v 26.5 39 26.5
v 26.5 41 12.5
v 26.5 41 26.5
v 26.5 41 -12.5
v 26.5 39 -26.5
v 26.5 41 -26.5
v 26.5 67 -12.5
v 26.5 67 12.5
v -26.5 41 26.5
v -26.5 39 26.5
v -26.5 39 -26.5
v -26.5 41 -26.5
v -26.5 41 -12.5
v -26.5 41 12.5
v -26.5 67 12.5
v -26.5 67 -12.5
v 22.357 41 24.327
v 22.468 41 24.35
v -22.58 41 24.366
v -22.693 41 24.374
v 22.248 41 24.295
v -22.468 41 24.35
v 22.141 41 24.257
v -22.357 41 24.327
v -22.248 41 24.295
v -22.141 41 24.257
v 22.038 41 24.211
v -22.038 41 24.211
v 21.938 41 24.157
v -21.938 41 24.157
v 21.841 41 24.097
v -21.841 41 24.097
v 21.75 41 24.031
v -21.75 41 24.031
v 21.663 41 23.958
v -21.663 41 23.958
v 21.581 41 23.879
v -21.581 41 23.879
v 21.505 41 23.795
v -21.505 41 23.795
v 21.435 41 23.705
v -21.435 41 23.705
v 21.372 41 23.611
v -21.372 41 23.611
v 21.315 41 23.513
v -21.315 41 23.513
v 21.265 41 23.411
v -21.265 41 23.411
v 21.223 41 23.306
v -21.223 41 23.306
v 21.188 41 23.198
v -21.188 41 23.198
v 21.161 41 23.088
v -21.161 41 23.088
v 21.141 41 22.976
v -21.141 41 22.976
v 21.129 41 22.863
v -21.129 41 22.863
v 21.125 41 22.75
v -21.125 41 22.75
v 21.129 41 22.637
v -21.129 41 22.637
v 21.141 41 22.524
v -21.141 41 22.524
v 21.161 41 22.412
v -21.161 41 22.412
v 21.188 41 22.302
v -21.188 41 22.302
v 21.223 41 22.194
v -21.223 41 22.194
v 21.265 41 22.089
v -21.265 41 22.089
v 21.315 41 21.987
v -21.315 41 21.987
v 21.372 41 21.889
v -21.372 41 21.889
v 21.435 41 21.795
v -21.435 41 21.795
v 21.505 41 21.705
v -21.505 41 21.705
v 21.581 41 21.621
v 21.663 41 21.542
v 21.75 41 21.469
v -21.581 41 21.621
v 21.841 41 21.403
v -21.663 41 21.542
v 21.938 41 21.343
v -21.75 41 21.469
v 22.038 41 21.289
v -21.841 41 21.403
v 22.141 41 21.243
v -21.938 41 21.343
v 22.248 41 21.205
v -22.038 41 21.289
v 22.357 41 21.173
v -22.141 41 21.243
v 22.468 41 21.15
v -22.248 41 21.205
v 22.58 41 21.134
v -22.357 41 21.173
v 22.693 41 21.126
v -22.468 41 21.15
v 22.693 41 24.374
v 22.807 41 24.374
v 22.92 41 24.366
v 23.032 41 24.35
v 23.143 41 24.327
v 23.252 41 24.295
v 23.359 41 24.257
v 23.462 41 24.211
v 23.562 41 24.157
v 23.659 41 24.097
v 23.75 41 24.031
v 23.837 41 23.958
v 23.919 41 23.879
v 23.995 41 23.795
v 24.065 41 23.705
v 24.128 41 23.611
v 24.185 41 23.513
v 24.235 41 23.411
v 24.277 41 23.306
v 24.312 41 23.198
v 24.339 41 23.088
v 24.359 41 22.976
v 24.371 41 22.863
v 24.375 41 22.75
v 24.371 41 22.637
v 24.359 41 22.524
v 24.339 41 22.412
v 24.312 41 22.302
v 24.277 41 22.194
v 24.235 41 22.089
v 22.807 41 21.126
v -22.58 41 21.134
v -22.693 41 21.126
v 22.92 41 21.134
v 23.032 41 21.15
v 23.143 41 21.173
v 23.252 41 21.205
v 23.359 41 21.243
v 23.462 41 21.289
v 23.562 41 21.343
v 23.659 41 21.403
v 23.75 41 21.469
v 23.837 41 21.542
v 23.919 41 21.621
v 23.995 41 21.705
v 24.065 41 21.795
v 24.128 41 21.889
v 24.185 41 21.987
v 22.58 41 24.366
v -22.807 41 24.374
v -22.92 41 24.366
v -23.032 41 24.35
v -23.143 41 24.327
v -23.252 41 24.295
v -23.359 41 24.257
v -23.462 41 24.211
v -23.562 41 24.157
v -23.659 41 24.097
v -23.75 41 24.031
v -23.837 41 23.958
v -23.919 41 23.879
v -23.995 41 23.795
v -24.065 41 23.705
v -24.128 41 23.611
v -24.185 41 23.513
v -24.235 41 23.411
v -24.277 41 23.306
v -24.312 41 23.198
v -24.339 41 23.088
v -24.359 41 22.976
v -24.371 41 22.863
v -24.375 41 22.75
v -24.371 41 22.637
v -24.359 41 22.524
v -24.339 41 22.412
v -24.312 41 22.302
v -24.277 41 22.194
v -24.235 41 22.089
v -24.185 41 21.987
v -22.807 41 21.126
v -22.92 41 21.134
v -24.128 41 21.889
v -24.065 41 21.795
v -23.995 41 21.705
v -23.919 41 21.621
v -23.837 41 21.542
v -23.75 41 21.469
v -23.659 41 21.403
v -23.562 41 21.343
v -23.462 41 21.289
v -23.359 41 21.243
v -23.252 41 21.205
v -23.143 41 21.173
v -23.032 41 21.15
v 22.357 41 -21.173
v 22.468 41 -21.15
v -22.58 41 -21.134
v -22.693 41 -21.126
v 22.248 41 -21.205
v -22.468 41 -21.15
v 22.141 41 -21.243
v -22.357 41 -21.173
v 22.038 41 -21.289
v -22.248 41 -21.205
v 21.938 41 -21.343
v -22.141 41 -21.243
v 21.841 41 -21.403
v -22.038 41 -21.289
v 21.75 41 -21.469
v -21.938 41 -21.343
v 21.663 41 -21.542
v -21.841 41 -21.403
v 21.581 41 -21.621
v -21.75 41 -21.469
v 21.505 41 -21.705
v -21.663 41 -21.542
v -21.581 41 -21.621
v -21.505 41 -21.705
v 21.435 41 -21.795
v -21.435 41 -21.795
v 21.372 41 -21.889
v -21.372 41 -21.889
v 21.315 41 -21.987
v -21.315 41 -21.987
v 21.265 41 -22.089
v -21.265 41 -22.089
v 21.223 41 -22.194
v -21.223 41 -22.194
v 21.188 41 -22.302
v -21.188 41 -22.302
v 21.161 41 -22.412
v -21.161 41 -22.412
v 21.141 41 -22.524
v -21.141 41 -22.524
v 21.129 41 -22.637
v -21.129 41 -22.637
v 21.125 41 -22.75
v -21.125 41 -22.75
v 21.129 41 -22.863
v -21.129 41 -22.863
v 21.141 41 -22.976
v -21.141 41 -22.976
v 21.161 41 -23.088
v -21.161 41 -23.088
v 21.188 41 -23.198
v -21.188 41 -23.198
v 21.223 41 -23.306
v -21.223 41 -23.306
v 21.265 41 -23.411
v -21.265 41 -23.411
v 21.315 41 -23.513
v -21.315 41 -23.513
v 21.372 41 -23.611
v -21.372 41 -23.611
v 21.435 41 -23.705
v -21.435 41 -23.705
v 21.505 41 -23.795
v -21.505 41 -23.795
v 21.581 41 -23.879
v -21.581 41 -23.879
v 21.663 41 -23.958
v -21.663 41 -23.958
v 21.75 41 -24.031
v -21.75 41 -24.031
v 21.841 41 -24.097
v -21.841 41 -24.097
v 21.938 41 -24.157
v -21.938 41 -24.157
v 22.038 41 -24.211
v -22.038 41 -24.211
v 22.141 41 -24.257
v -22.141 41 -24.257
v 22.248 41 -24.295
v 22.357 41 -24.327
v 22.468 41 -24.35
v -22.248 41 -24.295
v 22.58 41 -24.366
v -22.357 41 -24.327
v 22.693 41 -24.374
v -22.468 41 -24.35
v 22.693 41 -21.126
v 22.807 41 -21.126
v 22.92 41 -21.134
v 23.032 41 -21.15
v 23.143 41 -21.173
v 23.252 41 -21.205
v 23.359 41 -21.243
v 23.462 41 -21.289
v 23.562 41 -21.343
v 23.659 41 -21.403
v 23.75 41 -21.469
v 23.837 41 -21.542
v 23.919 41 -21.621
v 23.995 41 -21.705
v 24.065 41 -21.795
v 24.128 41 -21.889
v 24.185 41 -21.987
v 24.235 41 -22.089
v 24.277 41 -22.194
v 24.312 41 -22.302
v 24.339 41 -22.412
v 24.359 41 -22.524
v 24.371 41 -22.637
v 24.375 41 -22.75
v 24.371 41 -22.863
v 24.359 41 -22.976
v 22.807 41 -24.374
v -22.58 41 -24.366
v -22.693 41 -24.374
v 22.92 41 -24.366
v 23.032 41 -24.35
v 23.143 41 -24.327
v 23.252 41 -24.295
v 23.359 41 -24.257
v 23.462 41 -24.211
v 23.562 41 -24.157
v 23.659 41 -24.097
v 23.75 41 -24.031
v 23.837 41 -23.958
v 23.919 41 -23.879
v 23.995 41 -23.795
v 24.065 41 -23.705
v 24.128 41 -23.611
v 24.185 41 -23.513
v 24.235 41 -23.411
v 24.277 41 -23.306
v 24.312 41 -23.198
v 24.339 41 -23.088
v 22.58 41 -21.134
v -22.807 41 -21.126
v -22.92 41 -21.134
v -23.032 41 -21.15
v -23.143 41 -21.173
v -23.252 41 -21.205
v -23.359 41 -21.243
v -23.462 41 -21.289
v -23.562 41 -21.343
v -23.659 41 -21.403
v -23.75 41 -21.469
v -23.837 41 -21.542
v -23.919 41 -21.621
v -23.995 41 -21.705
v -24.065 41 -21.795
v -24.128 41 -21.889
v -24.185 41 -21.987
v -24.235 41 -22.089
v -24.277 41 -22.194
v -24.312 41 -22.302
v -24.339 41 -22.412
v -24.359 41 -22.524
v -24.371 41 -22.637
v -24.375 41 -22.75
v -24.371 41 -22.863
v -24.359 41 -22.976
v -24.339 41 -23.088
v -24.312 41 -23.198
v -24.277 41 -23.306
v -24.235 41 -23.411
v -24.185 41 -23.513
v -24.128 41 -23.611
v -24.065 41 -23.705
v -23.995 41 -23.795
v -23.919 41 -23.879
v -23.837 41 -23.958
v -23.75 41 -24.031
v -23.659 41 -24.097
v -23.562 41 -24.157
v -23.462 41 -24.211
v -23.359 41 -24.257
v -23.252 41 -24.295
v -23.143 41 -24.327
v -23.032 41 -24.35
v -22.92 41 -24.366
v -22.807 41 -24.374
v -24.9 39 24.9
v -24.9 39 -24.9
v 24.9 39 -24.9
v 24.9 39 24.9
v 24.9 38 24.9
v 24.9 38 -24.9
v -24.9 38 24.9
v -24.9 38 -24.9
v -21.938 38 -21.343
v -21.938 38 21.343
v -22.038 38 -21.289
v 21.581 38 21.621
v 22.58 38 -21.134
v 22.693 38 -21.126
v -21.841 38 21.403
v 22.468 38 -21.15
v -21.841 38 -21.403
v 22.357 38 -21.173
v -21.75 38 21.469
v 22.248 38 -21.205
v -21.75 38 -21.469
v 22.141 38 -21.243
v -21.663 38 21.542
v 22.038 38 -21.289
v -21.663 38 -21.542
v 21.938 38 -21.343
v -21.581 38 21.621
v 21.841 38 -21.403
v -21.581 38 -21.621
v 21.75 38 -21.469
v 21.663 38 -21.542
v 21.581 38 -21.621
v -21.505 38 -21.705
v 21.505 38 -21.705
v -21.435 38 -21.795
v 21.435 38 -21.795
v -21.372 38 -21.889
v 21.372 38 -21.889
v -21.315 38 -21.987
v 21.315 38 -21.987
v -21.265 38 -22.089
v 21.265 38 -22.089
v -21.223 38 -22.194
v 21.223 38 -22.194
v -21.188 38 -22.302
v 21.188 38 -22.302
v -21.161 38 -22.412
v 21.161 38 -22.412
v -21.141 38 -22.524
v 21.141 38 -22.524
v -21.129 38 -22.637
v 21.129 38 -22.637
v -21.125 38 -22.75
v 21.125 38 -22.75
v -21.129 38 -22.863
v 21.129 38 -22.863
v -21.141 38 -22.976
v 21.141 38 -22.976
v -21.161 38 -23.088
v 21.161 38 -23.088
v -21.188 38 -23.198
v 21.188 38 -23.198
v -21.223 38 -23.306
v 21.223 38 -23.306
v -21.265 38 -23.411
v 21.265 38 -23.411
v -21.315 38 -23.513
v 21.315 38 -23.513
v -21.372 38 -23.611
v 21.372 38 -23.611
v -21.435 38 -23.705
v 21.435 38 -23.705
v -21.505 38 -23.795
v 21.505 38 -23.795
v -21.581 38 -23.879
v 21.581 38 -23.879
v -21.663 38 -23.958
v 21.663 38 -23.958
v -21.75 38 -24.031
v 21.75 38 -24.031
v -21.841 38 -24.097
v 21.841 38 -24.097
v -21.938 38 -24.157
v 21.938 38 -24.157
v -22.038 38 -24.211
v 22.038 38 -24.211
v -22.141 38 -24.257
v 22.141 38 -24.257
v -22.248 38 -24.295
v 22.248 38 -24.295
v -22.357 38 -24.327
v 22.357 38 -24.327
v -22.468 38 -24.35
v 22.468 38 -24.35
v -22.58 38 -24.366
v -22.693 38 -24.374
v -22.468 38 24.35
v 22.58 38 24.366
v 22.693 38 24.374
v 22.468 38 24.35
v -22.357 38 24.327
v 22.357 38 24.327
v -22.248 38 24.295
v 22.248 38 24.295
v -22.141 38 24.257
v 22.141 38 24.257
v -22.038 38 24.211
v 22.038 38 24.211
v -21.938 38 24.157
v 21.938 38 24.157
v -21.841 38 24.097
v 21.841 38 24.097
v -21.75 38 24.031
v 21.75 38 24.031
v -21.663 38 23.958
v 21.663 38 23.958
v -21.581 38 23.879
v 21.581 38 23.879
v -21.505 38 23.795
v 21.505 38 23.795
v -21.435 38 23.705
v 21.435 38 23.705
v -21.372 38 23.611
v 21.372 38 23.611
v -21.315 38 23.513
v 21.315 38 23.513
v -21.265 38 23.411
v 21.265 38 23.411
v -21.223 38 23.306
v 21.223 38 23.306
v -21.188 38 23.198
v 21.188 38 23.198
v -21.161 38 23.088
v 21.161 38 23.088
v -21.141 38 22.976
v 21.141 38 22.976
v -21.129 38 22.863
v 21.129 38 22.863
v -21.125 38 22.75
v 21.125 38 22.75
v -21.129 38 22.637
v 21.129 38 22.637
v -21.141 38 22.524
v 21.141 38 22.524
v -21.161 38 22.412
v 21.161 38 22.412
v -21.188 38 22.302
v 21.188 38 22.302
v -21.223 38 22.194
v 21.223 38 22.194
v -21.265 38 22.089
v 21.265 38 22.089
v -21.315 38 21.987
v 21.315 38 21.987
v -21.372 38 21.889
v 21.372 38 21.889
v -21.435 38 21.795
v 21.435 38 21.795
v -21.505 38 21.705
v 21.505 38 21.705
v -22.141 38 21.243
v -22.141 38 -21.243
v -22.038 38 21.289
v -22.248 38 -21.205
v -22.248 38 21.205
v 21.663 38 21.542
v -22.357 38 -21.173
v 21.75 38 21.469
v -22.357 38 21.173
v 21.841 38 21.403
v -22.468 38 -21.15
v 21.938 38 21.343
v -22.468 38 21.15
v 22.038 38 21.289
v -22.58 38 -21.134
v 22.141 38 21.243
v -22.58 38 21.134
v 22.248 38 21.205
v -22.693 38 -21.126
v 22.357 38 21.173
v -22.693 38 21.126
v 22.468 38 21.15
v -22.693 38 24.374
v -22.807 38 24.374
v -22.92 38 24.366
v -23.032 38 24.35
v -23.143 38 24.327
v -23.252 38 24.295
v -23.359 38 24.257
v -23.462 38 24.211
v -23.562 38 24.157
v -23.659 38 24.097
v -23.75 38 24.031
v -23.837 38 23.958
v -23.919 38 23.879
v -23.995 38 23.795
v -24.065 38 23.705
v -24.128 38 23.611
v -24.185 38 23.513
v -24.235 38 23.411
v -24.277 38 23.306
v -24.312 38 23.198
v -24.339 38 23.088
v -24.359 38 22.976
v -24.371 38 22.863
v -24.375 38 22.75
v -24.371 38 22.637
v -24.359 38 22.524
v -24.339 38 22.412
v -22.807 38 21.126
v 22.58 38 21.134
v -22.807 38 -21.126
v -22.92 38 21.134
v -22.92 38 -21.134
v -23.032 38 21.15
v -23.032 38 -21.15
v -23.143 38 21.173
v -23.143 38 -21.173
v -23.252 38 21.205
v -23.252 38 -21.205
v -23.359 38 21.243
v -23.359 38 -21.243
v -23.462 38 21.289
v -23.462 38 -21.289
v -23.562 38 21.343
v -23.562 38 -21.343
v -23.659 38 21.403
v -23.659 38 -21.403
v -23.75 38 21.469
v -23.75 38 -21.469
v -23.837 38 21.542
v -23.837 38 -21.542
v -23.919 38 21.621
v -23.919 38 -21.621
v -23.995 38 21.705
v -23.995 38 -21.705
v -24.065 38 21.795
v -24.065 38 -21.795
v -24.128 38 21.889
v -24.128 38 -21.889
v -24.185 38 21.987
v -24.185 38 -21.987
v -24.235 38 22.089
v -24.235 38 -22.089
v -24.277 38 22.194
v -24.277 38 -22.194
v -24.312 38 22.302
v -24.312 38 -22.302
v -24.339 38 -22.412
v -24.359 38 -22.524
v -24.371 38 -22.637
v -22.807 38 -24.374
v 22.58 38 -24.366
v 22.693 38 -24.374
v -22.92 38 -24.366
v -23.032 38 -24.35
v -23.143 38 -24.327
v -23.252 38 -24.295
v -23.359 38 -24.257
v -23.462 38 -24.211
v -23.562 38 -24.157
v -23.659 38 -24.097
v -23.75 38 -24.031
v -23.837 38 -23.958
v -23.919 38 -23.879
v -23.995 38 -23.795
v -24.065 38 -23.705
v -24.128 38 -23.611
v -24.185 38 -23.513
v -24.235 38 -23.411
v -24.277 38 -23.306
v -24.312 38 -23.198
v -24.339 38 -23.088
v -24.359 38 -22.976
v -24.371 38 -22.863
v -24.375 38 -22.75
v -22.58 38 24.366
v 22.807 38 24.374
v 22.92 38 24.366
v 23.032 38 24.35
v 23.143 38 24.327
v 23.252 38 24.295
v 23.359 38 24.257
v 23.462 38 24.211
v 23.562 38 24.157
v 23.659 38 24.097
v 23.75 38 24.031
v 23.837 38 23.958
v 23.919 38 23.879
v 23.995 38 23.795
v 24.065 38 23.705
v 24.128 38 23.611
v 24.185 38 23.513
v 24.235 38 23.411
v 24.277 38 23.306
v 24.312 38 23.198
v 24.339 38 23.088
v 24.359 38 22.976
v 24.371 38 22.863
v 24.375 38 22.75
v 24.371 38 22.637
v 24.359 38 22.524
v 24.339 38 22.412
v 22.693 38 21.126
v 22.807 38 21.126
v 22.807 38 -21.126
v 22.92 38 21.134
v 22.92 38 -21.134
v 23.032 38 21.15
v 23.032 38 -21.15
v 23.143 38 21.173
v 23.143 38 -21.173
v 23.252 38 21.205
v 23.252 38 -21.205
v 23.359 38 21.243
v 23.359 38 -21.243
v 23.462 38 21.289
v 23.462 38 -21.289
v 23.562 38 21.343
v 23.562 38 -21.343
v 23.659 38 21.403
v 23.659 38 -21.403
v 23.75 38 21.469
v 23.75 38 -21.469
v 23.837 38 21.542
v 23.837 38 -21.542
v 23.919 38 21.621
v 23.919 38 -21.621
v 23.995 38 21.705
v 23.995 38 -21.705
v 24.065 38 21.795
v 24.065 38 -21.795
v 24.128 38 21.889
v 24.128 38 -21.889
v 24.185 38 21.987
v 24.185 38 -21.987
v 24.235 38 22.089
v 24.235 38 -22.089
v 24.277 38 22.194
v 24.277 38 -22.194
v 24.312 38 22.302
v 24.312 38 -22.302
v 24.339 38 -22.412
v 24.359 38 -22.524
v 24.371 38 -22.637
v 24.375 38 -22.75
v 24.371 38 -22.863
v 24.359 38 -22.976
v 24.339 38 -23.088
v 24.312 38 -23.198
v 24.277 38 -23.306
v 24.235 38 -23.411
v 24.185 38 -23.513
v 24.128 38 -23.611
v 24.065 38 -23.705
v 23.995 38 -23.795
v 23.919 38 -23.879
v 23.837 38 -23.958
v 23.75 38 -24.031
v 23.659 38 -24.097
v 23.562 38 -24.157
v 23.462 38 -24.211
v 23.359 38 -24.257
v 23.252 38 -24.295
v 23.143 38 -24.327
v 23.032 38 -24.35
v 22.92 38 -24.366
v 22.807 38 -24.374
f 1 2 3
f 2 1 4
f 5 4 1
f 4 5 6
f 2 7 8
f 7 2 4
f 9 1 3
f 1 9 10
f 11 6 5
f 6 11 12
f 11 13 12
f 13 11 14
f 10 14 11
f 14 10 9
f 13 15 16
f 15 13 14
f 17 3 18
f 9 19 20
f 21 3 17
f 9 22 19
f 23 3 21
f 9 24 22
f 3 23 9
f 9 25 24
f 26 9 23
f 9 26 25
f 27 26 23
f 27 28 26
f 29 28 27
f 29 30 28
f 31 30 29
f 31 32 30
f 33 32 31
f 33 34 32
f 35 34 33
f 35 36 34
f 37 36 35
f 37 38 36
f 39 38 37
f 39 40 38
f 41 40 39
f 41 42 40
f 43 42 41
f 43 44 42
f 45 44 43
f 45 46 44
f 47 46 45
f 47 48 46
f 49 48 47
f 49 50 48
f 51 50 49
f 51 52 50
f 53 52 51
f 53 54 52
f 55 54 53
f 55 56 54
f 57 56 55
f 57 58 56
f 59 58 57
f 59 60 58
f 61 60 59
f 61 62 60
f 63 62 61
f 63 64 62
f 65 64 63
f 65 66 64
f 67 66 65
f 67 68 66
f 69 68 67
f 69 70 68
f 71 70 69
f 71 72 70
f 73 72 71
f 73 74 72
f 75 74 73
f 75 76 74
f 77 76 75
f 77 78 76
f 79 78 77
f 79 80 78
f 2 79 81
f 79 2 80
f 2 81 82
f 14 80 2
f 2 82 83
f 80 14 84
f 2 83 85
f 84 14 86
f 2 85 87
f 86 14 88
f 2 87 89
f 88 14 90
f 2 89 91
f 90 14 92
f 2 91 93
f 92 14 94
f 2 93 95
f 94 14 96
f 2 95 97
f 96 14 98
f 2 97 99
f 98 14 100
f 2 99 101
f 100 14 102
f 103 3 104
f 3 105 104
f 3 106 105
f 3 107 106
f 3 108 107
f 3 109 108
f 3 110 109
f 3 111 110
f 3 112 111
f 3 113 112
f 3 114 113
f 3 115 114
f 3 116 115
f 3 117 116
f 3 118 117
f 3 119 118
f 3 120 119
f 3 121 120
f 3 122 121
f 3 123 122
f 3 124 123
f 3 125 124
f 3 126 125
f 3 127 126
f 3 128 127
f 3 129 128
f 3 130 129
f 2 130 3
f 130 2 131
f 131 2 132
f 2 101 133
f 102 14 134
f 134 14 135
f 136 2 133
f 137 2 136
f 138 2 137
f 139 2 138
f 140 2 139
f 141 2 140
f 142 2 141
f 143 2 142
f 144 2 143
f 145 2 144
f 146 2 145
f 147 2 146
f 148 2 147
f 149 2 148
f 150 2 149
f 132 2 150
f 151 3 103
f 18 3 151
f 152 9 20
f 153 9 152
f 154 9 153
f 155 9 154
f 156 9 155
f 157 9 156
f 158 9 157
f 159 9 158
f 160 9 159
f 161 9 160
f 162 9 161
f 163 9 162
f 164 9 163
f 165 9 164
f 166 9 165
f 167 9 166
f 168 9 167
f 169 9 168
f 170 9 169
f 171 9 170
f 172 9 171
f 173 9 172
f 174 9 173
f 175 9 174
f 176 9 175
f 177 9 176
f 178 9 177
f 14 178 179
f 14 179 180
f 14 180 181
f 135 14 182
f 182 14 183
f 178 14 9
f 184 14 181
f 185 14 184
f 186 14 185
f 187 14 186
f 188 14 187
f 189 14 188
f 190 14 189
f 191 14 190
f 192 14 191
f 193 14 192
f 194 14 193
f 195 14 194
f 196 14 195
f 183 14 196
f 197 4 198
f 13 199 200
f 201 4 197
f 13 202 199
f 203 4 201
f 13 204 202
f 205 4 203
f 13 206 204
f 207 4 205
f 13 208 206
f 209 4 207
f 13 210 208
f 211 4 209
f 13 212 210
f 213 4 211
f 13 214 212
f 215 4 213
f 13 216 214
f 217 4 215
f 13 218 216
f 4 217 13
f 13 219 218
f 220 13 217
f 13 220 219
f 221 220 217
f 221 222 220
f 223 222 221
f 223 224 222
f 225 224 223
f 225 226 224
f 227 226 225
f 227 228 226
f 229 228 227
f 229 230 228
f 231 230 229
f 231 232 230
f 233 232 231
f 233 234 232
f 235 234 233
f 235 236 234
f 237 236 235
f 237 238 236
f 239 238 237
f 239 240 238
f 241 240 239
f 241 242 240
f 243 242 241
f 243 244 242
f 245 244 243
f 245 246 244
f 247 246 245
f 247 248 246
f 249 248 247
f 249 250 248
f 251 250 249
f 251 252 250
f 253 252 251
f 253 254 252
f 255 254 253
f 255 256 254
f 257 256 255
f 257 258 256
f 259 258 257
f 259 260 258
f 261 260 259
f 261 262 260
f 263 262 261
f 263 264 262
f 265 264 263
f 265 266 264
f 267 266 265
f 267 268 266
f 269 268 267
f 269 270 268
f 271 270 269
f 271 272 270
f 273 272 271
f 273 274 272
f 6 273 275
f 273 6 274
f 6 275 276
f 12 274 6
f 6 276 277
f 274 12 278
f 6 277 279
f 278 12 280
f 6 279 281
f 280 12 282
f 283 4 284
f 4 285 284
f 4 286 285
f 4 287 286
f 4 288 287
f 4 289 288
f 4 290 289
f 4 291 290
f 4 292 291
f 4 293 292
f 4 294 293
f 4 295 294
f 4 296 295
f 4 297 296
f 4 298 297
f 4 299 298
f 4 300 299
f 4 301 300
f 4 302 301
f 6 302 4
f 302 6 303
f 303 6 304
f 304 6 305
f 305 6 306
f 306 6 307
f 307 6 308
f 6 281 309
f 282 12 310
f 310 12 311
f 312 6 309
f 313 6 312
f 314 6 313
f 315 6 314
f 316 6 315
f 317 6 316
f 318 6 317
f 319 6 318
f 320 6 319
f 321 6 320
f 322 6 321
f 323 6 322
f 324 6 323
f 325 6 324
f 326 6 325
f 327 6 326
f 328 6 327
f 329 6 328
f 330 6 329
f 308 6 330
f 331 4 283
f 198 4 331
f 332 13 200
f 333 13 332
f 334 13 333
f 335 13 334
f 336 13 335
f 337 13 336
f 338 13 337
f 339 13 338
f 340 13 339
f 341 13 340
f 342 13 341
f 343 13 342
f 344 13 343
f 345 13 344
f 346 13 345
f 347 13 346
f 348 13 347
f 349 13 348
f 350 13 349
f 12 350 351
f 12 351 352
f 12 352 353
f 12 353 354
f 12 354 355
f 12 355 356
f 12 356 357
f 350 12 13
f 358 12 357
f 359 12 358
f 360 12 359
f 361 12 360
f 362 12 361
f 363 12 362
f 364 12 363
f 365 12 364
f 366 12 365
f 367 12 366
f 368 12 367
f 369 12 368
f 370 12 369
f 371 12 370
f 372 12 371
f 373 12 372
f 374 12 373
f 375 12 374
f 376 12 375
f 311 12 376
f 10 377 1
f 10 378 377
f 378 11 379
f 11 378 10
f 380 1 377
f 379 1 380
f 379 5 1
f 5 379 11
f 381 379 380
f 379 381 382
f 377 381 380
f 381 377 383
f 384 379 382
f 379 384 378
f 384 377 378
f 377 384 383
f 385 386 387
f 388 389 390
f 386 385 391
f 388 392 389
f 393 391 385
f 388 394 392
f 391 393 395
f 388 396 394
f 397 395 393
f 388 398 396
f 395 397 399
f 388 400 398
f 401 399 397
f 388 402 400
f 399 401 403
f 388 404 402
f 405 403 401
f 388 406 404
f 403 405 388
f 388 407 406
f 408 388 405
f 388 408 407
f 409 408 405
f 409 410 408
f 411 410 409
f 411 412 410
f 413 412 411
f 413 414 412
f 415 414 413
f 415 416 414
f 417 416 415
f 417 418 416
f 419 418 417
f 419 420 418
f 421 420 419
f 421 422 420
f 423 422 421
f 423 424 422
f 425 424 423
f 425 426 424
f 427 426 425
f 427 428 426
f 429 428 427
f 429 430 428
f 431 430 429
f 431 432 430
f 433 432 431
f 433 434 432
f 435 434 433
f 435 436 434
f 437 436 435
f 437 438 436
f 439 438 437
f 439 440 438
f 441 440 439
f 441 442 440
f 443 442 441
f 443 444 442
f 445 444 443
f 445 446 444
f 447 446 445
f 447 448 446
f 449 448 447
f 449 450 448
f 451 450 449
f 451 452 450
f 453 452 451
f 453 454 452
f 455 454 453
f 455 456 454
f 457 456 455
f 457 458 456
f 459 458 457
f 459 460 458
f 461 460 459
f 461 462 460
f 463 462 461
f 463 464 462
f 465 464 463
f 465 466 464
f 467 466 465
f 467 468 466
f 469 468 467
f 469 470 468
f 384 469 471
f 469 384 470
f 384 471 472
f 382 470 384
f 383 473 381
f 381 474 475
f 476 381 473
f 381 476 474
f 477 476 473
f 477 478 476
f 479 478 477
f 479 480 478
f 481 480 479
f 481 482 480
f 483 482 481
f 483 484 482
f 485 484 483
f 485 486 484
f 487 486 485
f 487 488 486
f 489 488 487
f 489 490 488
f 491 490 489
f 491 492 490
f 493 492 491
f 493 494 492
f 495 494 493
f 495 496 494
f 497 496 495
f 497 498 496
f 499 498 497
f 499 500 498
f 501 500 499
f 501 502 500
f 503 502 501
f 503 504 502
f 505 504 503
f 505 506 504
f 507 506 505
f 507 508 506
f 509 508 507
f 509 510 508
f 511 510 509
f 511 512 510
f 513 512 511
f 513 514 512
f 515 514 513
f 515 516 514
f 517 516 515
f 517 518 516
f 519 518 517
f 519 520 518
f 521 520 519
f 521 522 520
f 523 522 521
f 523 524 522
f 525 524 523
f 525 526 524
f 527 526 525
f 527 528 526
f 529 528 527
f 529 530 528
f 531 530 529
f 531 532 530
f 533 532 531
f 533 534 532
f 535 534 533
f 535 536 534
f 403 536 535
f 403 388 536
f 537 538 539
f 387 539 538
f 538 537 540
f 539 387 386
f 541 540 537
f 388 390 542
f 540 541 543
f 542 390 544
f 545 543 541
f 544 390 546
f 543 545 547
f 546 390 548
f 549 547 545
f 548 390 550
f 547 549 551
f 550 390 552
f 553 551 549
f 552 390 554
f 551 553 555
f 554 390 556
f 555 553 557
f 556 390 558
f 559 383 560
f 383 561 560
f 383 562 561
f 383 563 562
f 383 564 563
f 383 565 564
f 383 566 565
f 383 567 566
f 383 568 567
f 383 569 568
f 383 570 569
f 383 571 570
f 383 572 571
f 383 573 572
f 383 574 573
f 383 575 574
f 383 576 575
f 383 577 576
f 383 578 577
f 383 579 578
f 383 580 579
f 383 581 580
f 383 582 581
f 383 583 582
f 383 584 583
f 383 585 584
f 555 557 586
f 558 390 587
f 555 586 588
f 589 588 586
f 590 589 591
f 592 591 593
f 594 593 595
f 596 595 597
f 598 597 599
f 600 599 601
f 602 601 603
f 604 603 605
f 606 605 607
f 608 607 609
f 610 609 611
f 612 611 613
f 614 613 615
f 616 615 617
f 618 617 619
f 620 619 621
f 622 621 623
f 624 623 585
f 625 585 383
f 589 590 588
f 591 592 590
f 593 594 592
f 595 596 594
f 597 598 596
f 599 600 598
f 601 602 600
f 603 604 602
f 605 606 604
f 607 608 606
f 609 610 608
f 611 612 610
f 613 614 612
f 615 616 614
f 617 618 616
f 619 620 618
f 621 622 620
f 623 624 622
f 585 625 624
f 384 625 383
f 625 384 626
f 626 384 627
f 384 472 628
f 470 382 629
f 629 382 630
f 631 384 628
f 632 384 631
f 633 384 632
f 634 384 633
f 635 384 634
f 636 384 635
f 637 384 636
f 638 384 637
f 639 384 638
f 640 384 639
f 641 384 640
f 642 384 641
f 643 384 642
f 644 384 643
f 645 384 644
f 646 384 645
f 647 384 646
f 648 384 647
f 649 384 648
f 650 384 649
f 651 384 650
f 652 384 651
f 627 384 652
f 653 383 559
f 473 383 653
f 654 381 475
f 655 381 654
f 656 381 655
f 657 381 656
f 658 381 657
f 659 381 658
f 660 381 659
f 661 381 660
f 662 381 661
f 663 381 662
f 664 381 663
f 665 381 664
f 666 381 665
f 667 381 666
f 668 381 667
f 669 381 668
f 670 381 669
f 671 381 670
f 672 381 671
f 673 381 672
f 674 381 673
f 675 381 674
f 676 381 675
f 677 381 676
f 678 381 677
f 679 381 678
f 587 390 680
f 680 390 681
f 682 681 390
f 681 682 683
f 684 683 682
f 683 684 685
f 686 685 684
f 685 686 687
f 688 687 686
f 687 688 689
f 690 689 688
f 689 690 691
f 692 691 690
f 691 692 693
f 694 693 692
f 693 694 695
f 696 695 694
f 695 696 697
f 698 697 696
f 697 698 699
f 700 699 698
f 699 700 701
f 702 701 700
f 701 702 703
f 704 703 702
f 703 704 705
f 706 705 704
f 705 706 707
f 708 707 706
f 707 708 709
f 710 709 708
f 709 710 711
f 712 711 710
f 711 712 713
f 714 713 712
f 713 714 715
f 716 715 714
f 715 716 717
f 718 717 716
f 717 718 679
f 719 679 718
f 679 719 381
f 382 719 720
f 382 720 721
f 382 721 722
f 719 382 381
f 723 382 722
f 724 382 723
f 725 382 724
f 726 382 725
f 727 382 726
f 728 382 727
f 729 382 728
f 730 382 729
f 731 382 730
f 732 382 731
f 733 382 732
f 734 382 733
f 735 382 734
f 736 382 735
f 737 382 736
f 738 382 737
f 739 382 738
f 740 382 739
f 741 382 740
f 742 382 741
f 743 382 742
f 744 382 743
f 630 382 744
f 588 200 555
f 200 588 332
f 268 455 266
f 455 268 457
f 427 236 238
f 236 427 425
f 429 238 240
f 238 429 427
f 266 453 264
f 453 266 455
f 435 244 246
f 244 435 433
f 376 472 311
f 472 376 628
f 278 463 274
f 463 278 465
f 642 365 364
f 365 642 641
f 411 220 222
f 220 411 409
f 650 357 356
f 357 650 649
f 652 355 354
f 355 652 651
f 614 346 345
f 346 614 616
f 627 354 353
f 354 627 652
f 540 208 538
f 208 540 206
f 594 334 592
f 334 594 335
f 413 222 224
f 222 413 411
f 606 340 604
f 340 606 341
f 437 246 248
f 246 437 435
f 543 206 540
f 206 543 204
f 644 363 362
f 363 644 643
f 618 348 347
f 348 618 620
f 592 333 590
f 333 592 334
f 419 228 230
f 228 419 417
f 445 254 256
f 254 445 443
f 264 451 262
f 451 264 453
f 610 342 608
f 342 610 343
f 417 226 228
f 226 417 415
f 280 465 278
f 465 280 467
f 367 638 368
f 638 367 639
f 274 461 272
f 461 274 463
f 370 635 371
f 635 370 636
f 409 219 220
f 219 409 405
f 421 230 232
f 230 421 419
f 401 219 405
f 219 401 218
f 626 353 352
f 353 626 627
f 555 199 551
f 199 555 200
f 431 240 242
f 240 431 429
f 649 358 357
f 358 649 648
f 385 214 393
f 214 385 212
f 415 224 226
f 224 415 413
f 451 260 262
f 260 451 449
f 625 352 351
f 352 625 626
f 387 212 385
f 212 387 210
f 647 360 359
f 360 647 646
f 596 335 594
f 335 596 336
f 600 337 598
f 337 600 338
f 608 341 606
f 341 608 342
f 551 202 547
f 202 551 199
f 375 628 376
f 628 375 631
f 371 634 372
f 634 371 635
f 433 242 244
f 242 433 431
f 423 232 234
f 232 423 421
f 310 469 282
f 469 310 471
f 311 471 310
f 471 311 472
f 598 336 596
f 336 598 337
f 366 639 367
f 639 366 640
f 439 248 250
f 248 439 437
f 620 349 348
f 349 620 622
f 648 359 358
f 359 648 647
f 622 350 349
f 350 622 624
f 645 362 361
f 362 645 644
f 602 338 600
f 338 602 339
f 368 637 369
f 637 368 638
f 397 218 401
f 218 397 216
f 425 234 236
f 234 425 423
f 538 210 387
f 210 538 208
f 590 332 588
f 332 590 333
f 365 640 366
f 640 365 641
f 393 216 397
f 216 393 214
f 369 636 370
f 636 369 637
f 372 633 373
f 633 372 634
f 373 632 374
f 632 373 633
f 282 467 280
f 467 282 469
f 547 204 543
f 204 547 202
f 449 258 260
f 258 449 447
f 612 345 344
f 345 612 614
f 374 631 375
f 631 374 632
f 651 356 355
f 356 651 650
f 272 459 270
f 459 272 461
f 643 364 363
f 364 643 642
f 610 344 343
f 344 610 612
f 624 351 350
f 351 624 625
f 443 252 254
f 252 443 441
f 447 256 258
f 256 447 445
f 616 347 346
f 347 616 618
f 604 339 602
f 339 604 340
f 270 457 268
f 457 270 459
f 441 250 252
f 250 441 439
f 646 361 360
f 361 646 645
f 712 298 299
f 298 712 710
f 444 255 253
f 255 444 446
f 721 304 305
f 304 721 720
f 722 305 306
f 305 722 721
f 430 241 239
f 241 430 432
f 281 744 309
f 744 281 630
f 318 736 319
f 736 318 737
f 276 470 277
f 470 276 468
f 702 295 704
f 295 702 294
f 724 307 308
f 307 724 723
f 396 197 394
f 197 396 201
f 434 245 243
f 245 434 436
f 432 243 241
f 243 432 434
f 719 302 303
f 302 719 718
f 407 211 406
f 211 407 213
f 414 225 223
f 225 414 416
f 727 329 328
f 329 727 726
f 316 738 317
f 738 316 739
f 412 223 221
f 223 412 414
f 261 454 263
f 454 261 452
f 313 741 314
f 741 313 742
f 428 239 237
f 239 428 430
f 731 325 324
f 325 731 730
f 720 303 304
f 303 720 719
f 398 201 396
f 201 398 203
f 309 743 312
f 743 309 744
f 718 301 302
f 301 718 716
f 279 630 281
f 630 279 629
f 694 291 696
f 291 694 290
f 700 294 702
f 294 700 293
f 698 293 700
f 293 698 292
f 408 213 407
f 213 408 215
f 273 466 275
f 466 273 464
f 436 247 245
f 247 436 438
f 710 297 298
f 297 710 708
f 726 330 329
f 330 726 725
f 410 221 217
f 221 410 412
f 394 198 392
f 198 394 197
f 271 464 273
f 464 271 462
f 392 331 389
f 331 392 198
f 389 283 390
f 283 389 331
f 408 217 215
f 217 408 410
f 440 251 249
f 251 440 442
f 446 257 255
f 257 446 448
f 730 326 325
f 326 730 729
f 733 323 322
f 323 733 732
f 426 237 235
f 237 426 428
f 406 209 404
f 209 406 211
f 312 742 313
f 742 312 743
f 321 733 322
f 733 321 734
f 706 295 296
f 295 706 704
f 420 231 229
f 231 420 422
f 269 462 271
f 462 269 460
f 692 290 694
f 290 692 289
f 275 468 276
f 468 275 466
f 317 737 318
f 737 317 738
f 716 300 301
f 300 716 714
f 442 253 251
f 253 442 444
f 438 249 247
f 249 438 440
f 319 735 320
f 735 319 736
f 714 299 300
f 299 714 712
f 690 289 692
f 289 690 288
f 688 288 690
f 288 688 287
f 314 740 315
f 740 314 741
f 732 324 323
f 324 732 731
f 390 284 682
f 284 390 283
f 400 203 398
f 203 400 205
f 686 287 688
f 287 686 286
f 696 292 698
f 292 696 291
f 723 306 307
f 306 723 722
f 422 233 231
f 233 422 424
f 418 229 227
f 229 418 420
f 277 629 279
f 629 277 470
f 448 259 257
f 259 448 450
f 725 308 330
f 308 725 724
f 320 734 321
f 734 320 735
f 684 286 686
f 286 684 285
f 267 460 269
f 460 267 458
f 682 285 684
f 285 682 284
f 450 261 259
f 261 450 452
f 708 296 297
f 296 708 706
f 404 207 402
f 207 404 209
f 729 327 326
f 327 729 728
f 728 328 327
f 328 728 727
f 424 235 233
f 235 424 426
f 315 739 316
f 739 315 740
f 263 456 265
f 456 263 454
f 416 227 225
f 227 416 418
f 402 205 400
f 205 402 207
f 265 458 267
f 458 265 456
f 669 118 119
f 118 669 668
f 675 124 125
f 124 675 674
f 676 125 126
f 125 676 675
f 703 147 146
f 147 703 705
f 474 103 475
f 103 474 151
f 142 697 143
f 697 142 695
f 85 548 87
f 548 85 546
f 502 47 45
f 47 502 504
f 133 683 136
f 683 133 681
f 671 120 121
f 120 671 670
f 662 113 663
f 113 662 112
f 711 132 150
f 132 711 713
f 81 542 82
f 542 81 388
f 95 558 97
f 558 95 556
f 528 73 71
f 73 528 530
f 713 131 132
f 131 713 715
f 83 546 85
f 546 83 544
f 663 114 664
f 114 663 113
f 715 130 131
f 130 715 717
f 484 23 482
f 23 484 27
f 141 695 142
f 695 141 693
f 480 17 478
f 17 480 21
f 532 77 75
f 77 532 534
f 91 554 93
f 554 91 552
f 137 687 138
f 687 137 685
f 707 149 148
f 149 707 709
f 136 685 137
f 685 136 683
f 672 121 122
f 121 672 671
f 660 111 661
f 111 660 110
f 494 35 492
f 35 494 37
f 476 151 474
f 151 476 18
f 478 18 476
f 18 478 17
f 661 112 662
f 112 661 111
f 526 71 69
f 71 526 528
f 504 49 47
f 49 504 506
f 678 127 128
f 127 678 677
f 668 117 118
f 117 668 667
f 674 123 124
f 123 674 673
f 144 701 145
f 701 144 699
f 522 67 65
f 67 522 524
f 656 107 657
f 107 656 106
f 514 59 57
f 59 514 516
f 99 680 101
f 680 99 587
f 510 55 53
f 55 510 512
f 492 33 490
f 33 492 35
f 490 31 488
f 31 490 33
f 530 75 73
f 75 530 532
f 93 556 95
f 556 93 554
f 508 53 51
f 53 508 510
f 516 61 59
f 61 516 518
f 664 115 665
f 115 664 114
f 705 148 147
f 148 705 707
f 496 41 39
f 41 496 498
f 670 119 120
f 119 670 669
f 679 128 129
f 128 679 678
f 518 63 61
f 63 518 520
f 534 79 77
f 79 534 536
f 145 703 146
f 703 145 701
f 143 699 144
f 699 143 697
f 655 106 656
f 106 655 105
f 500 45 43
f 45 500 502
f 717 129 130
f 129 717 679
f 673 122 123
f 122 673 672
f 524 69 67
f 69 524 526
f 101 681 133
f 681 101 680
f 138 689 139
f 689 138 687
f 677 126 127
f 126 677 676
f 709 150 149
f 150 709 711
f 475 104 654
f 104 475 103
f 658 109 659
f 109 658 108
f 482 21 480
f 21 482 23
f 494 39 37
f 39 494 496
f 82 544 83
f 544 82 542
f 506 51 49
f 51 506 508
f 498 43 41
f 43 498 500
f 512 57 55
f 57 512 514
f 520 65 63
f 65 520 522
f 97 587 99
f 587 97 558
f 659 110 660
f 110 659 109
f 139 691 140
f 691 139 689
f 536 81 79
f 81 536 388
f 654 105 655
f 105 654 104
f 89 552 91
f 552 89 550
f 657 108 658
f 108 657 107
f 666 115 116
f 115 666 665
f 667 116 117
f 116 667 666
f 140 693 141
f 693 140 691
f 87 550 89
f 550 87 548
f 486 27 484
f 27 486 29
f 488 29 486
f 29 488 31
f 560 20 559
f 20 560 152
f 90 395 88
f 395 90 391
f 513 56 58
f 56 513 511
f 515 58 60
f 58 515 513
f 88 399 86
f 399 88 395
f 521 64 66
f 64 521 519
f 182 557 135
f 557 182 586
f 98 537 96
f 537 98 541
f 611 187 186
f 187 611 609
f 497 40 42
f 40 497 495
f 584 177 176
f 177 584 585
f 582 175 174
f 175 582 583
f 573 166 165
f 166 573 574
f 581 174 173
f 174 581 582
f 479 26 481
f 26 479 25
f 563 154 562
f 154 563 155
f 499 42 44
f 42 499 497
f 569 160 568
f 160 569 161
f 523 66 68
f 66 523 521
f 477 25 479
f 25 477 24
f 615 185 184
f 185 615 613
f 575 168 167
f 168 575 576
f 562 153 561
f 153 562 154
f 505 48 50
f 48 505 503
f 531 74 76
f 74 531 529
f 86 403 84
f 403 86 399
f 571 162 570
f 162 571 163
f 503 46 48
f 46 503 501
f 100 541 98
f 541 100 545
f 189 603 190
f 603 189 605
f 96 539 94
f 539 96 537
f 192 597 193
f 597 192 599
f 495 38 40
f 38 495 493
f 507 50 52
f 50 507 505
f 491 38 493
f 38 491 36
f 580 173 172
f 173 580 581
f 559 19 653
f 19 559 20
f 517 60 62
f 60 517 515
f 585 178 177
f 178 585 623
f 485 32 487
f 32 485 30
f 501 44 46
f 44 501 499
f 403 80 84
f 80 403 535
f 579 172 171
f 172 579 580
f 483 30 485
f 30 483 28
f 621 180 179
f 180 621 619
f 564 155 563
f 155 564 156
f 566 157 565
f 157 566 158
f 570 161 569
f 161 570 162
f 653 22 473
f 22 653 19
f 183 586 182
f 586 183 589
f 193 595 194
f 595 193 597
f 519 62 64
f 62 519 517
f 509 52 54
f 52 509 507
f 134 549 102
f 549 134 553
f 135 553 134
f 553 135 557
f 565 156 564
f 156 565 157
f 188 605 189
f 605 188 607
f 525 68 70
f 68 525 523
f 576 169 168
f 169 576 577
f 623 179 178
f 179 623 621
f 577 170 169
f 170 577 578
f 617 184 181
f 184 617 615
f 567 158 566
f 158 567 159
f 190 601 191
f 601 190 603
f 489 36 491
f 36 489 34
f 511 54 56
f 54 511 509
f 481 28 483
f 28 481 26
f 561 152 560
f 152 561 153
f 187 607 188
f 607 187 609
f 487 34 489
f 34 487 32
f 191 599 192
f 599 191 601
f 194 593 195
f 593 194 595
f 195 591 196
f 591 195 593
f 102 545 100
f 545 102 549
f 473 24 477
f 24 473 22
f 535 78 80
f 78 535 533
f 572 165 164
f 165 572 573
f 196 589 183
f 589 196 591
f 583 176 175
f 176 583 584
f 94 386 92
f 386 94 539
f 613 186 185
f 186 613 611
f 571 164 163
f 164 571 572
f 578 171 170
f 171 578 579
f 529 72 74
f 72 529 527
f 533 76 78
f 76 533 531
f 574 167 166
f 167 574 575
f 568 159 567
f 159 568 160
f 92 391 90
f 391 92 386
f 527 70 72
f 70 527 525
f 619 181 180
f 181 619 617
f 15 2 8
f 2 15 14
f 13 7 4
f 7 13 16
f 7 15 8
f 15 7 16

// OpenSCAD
$fn = $preview ? 50 : 90;

!translate([0, 40, 0]) Back();
//PIRScrewMount();

Case();
translate([0, -35 + 2.5, 0]) PIRMount();

module PIRScrewMount() {
  difference() {
        cube([14, 2, 5], true);
        translate([0, 1, 0]) 
            rotate([90, 0, 0]) 
                translate([0, 0, -1]) cylinder(d = 2.5, h = 6);
    }   
}

module Back() {
    difference() {
        translate([0, 0, 0]){
            cube([53, 2, 53], true);
            translate([0, -1, 0]) cube([49.8, 2, 49.8], true);
        }
        translate([0, 10, 0]) ScrewsGuide(true);
    }  
    translate([0, 13.5, 0]) cube([53, 27, 25], true);
}

module Case() {
    tempertureSensorDepth = -30;
    
    translate([0, -20, 0]) difference() {
        cube([53, 28 + 2, 53], true);
        cube([50, 74, 50], true);
        
        //Cut off for cable
        translate([0, 14.1, -26]) cube([5, 2.5, 5], true);
        
        //Cut off for faster printing
        //translate([0, 10, 0]) cube([70, 65, 70], true);
        
    }
    
    // PIR sides fill
    translate([-19, -34, 0]) cube([14, 2, 50], true);
    difference() {
        translate([19, -34, 0]) cube([14, 2, 50], true);
        
        //Cut off for temperature sensor
        translate([0, tempertureSensorDepth, 0]) 
            translate([19, 0, 0]) 
                cube([4.5, 8, 4.5], true);
    }
    
    translate([0, -34, -24]) cube([50, 2, 4], true);
    translate([0, -34, 24]) cube([50, 2, 4], true);
    
    // Temp sensor hole
    translate([19, tempertureSensorDepth, 0]) difference() {
        cube([8, 6, 8], true);
        translate([0, 2, 0]) cube([4.5, 20, 4.5], true);
    }
    
    // Atom mount
    translate([-18.5, -28, 7.25]) difference() {
        cube([9.8 + 4, 10, 24.5 + 4], true);
        cube([9.8, 20, 24.5], true);
        translate([0, 6, -14]) cube([9.8, 10, 5], true);
    }
    
    // Screws guide
    ScrewsGuide();
}

module ScrewsGuide(onlyBolts = false) {
    translate([-22.75, -6, -22.75]) ScrewMount(onlyBolts);
    translate([22.75, -6, -22.75]) ScrewMount(onlyBolts);
    translate([22.75, -6, 22.75]) ScrewMount(onlyBolts);
    translate([-22.75, -6, 22.75]) ScrewMount(onlyBolts);
}

module ScrewMount(onlyBolts) {
    rotate([90, 0, 0]) {
        if (onlyBolts) {
            translate([0, 0, -0.1]) cylinder(d = 3 + 0.25, h = 15);
        } else {
            difference() {
                cylinder(d = 6.5, h = 27);
                translate([0, 0, -0.1]) cylinder(d = 3, h = 15);
            }
        }
    }
}

module PIRMount() {
    pir_diameter = 10;
    
    difference() {
        translate([0, 0, 0]) {
            difference() {
                difference() {
                    
                    // Main shape
                    cube([26, 5, 45], true);
                    
                    // PIR sensor hole
                    translate([0, 10, 10]) 
                        rotate([90, 0, 0]) 
                            cylinder(d = pir_diameter, h = 40);
                    
                    // Front cut off
                    translate([0, -10, 10]) sphere(d = 23);
                }
                // Cut off for connector
                translate([0, 0.9, -(3 + 9)]) cube([11, 4, 14], true);
            }
            
            // Screw guide
            translate([0, 4.9, 2.5 - 4.4]) 
                rotate([90, 0, 0]) 
                    cylinder(d = 5, h = 2.9);
            
            // Supports
            translate([8, 3.7, 4.4]) 
                rotate([90, 0, 0]) 
                    cylinder(d = 4, h = 1.8);
            translate([-7, 3.7, 15]) 
                rotate([90, 0, 0]) 
                    cylinder(d = 4, h = 1.8);
        }
        
        // Screw hole
        translate([0, 4.5, 2.5 - 4.4]) 
            rotate([90, 0, 0]) 
                translate([0, 0, -1]) cylinder(d = 2, h = 6);
    }
}
